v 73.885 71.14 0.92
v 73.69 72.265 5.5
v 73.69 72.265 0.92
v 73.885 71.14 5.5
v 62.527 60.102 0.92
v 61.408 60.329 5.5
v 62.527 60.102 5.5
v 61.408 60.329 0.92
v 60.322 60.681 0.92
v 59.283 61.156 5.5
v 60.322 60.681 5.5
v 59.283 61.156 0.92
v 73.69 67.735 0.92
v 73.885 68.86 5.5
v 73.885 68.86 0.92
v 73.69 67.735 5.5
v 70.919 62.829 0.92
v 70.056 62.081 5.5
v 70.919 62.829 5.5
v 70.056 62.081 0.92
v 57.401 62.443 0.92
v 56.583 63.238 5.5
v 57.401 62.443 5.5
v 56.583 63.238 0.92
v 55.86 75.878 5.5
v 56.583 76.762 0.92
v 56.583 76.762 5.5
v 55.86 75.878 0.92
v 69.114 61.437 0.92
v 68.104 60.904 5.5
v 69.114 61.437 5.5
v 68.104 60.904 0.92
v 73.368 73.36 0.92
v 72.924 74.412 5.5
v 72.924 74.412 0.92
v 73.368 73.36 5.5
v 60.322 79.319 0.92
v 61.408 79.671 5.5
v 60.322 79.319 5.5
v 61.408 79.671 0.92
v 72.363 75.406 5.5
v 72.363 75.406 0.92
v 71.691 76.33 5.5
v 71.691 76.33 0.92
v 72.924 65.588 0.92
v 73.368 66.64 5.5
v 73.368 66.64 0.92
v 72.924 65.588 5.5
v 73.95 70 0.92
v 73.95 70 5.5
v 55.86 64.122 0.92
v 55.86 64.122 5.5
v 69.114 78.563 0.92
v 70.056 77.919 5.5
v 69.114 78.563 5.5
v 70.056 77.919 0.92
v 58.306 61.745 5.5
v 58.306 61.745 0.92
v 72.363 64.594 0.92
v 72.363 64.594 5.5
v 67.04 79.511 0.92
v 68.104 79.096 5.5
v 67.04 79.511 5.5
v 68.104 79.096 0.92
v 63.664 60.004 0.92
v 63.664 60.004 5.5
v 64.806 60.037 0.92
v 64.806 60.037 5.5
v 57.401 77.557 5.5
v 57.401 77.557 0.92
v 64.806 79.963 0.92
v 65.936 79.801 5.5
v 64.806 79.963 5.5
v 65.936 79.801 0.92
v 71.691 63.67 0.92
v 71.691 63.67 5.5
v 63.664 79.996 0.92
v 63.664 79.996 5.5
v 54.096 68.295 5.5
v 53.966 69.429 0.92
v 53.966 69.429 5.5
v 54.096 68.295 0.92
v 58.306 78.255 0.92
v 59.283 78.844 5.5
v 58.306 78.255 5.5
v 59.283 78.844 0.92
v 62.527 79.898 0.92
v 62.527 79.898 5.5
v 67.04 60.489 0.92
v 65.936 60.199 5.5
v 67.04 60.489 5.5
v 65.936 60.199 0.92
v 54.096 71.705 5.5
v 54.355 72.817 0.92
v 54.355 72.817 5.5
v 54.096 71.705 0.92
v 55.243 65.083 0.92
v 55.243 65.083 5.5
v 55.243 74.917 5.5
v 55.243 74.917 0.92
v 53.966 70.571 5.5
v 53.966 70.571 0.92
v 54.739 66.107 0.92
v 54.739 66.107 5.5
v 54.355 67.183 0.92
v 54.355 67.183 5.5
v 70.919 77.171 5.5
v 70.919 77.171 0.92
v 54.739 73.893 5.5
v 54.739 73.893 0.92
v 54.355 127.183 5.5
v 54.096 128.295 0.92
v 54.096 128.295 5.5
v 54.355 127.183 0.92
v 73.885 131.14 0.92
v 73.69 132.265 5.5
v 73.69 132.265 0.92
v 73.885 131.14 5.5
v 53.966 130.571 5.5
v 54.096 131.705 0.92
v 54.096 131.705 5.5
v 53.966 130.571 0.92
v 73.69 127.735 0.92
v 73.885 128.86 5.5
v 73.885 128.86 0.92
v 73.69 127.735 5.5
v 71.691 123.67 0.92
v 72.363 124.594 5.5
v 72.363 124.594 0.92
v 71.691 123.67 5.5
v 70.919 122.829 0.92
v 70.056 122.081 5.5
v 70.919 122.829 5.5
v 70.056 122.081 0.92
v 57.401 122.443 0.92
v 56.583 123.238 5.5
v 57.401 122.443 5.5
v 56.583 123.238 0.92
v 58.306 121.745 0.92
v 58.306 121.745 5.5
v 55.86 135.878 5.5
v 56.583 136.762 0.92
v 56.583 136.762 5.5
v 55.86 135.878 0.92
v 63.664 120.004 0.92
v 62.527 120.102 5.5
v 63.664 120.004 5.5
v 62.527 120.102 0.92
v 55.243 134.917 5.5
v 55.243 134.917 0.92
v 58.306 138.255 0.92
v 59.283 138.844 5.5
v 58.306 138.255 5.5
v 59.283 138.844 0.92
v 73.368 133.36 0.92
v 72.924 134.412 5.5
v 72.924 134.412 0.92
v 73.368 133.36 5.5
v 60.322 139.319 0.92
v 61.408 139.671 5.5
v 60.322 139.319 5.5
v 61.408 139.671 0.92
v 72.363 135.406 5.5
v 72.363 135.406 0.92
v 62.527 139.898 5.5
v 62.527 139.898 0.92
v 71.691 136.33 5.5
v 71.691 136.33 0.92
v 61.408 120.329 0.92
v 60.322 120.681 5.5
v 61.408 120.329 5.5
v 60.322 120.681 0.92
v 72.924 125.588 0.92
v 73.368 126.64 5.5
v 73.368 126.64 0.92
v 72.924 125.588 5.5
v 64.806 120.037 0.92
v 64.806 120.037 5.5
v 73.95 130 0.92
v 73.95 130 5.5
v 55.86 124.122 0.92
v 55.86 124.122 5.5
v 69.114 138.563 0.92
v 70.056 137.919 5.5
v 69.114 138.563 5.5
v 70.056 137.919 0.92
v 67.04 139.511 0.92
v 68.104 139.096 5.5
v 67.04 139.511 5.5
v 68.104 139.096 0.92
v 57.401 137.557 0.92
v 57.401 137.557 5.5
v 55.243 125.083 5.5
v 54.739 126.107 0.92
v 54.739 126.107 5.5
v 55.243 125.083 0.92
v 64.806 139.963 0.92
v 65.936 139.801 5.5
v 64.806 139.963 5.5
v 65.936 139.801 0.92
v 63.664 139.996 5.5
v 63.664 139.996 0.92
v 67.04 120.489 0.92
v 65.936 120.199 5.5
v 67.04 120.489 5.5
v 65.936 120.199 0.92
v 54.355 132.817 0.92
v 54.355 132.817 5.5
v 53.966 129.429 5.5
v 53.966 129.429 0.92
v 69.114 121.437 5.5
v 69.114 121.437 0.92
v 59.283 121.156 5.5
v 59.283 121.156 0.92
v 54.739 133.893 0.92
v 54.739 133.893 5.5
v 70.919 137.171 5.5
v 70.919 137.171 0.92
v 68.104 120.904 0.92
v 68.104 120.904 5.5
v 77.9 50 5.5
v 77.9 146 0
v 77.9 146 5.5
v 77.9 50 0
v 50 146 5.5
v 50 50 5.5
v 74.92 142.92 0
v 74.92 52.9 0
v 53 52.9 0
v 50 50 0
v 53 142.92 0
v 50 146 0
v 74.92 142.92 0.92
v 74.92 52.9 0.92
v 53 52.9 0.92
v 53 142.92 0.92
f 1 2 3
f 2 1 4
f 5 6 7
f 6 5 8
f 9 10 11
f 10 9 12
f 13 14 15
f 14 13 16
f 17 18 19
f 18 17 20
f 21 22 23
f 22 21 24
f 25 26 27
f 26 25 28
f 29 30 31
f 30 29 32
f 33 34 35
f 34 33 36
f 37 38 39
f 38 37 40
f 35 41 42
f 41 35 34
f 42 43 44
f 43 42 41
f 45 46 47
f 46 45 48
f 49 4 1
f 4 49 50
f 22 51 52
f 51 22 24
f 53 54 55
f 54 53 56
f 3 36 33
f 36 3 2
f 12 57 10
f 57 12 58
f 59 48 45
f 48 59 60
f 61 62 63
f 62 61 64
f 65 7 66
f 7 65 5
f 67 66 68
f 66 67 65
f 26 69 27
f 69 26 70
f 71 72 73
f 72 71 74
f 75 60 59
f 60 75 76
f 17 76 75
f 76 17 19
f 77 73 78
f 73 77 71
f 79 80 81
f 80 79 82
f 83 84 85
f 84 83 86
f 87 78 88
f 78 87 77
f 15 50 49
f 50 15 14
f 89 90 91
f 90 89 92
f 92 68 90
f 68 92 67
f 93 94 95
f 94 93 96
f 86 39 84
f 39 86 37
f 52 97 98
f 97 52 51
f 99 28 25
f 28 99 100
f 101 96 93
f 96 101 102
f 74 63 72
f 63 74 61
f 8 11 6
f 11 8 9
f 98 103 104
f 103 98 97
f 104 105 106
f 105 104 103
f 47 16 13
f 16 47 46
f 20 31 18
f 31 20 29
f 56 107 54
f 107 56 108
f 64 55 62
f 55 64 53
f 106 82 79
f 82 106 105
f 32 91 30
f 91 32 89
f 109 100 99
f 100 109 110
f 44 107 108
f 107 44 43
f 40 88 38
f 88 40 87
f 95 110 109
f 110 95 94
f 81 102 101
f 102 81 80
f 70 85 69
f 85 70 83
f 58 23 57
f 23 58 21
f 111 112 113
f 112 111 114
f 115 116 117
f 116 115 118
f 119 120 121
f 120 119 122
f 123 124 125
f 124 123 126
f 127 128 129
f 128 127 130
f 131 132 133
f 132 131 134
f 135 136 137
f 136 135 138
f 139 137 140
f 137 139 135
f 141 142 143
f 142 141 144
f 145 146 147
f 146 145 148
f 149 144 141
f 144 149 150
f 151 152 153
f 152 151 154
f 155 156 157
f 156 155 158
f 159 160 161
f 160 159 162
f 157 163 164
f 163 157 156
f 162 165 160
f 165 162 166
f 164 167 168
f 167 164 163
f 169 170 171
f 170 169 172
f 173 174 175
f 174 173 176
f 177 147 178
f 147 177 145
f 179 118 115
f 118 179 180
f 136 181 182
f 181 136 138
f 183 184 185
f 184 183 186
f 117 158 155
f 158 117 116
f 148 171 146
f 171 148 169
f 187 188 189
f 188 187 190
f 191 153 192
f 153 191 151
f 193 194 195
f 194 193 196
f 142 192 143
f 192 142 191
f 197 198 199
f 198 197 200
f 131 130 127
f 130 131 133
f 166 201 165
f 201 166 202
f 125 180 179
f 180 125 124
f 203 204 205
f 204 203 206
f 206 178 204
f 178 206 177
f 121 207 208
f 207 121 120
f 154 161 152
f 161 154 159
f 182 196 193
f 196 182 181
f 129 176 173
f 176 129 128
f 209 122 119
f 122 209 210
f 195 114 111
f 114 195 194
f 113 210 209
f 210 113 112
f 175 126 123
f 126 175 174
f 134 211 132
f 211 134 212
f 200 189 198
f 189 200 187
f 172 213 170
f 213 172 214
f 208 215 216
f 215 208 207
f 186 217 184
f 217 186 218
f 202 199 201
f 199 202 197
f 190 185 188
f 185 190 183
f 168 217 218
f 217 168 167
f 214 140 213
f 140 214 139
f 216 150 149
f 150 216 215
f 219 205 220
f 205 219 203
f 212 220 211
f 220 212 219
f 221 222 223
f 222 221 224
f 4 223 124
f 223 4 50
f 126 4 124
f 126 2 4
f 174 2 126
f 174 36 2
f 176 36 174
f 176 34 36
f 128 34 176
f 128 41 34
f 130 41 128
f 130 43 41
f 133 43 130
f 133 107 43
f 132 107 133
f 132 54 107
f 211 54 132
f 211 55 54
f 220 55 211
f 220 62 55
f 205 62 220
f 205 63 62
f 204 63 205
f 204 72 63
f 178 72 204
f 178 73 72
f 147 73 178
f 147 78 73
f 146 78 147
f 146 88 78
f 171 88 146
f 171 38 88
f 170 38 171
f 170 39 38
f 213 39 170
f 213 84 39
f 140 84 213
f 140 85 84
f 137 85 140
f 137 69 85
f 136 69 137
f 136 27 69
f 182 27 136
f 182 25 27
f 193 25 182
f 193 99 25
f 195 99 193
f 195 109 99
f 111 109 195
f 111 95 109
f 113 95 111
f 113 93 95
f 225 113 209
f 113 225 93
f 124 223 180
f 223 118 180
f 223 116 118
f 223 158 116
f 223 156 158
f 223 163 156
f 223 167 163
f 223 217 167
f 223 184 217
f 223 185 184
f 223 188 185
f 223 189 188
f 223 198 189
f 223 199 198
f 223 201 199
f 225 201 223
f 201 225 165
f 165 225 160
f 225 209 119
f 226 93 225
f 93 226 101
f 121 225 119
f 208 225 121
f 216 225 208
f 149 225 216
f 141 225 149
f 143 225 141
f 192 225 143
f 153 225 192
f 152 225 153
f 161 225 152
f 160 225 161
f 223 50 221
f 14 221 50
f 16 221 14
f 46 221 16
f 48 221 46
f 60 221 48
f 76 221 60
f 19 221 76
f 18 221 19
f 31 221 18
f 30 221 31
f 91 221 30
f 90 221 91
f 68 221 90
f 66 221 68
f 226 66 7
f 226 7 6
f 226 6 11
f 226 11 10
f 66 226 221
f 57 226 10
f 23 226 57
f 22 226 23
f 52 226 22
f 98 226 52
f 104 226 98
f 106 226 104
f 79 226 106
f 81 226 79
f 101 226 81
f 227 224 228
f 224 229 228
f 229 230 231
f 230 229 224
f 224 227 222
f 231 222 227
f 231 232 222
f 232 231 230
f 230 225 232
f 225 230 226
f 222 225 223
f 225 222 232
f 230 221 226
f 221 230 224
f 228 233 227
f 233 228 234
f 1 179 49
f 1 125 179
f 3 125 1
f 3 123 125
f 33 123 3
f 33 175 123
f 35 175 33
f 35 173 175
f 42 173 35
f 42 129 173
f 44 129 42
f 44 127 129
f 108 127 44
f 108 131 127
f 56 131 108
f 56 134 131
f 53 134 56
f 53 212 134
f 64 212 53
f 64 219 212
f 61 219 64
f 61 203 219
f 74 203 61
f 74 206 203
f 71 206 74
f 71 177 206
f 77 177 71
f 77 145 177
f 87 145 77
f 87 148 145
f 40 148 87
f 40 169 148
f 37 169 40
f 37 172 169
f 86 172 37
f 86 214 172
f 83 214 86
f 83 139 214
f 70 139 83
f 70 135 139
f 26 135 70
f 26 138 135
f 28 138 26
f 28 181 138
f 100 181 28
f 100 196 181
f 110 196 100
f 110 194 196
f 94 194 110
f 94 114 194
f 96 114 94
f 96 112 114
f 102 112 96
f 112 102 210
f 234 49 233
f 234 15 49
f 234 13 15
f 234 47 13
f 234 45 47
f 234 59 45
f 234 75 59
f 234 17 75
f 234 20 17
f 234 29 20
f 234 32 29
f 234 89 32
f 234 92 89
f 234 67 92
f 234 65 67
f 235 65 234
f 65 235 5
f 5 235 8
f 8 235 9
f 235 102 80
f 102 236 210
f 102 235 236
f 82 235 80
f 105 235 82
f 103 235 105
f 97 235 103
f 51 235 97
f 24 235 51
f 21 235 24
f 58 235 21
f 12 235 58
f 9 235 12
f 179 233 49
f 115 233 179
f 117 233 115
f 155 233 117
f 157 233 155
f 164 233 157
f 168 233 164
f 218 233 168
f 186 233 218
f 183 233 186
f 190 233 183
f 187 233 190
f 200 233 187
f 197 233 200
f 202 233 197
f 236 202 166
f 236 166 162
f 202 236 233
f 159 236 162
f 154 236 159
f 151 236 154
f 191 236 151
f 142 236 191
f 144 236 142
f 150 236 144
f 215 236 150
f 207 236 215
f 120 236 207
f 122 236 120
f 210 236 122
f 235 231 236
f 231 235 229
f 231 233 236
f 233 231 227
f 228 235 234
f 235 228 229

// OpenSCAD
// Schutz Kappe für LiFepo verbinder
debug=0;

debugFrames=1*debug;

// Select part to render/print
part=0; // [ 0:All, 11:SchutzKappe]

// Border for walls 
border=1.3;
// Border thinner walls 
border1=1;

// Add Space to fit
addSpace=.3;
addSpaceXYZ=addSpace*[1,1,1];
addSpace2XYZ=addSpace*2*[1,1,1];


// -----------------------------------------------------------------
// do not need to modify anything below here
// -----------------------------------------------------------------
/* [Hidden] */

// Number of segments in circle
$fn=55;

showMain();

// ----------------------------------------------------------------
// Definition of Available Parts

// Show the selected part
// part=0 shows all parts in a grid
module showPart(part=0){
    if ( part == 0) showAllParts();
    
 
    // Part Ids for Debugging
	if ( part == 11) SchutzKappe();

	
    if ( debug ) {
	if ( part == 21) Screw();
    if ( part == 22) GrinderWheel();
	
    }
}


// --------------------------------------------------------------------
module SchutzKappe(){ 

    verbinder=[21.9,90,1];
    M8_Kopf=10;
    M8_Kopf_h=4.5;

//    dicke=3;
    dickeOben=M8_Kopf_h;
    dickeSeite=3;
    
    difference(){
        // Äußere Hülle
        cube(verbinder+[2*dickeSeite,2*dickeSeite,dickeOben]);
    
        // Ausschnitt Verbinder
        translate([dickeSeite,-.1+dickeSeite,-.1+0])
            cube(verbinder+.01*[2,2,2]);
    
        // Schrauben Aussparung
        for ( y = [20,80]){
            translate([verbinder[0]/2+dickeSeite,y,0]){
            
            translate([0,0,-.1])
               cylinder(h=verbinder[2]+dickeOben*2+1,r=M8_Kopf);
            }
        };
    }
    
}


// ------------------------------------------------------------------
// Helper Routines

// place all Partes in a grid
 module showAllParts(){
    distX=100;  maxX=5;
    distY=100; maxY=5;

    for ( i = [1:maxX] )
            for ( j = [0:maxY] ){
                translate([ (i-.5)*distX, (j-.5)*distY, 0])
                    showPart(part= i + j*10);
                if ( debugFrames ) 
                    translate([ (i-1)*distX, j*distY, 0])
                    	debugFrame(size=[distX-3,distY-3,1]);
                }
        
}

module debugFrame( size=[60,60,2], border=.3) {
    translate([0,0,-size[2]])
	    color("white") 
		    difference(){
		        cube(size);
		        translate( [0, 0, .01]
		        		 + border*[1, 1, 0])
		            cube(size - 2*border*[1,1,0]+[0,0,size[2]]);
		    }
}


module showMain(){
    difference(){
        showPart(part=part);
 
        // for Debugging 
        // to see inside Objects
        // cube to cut object apart 
        if ( 0 * debug ) 
            translate([59,-2,-11.1]) 
            // translate([-14,2,-31.1]) 
                cube([120,190,55]);
    } 
}
